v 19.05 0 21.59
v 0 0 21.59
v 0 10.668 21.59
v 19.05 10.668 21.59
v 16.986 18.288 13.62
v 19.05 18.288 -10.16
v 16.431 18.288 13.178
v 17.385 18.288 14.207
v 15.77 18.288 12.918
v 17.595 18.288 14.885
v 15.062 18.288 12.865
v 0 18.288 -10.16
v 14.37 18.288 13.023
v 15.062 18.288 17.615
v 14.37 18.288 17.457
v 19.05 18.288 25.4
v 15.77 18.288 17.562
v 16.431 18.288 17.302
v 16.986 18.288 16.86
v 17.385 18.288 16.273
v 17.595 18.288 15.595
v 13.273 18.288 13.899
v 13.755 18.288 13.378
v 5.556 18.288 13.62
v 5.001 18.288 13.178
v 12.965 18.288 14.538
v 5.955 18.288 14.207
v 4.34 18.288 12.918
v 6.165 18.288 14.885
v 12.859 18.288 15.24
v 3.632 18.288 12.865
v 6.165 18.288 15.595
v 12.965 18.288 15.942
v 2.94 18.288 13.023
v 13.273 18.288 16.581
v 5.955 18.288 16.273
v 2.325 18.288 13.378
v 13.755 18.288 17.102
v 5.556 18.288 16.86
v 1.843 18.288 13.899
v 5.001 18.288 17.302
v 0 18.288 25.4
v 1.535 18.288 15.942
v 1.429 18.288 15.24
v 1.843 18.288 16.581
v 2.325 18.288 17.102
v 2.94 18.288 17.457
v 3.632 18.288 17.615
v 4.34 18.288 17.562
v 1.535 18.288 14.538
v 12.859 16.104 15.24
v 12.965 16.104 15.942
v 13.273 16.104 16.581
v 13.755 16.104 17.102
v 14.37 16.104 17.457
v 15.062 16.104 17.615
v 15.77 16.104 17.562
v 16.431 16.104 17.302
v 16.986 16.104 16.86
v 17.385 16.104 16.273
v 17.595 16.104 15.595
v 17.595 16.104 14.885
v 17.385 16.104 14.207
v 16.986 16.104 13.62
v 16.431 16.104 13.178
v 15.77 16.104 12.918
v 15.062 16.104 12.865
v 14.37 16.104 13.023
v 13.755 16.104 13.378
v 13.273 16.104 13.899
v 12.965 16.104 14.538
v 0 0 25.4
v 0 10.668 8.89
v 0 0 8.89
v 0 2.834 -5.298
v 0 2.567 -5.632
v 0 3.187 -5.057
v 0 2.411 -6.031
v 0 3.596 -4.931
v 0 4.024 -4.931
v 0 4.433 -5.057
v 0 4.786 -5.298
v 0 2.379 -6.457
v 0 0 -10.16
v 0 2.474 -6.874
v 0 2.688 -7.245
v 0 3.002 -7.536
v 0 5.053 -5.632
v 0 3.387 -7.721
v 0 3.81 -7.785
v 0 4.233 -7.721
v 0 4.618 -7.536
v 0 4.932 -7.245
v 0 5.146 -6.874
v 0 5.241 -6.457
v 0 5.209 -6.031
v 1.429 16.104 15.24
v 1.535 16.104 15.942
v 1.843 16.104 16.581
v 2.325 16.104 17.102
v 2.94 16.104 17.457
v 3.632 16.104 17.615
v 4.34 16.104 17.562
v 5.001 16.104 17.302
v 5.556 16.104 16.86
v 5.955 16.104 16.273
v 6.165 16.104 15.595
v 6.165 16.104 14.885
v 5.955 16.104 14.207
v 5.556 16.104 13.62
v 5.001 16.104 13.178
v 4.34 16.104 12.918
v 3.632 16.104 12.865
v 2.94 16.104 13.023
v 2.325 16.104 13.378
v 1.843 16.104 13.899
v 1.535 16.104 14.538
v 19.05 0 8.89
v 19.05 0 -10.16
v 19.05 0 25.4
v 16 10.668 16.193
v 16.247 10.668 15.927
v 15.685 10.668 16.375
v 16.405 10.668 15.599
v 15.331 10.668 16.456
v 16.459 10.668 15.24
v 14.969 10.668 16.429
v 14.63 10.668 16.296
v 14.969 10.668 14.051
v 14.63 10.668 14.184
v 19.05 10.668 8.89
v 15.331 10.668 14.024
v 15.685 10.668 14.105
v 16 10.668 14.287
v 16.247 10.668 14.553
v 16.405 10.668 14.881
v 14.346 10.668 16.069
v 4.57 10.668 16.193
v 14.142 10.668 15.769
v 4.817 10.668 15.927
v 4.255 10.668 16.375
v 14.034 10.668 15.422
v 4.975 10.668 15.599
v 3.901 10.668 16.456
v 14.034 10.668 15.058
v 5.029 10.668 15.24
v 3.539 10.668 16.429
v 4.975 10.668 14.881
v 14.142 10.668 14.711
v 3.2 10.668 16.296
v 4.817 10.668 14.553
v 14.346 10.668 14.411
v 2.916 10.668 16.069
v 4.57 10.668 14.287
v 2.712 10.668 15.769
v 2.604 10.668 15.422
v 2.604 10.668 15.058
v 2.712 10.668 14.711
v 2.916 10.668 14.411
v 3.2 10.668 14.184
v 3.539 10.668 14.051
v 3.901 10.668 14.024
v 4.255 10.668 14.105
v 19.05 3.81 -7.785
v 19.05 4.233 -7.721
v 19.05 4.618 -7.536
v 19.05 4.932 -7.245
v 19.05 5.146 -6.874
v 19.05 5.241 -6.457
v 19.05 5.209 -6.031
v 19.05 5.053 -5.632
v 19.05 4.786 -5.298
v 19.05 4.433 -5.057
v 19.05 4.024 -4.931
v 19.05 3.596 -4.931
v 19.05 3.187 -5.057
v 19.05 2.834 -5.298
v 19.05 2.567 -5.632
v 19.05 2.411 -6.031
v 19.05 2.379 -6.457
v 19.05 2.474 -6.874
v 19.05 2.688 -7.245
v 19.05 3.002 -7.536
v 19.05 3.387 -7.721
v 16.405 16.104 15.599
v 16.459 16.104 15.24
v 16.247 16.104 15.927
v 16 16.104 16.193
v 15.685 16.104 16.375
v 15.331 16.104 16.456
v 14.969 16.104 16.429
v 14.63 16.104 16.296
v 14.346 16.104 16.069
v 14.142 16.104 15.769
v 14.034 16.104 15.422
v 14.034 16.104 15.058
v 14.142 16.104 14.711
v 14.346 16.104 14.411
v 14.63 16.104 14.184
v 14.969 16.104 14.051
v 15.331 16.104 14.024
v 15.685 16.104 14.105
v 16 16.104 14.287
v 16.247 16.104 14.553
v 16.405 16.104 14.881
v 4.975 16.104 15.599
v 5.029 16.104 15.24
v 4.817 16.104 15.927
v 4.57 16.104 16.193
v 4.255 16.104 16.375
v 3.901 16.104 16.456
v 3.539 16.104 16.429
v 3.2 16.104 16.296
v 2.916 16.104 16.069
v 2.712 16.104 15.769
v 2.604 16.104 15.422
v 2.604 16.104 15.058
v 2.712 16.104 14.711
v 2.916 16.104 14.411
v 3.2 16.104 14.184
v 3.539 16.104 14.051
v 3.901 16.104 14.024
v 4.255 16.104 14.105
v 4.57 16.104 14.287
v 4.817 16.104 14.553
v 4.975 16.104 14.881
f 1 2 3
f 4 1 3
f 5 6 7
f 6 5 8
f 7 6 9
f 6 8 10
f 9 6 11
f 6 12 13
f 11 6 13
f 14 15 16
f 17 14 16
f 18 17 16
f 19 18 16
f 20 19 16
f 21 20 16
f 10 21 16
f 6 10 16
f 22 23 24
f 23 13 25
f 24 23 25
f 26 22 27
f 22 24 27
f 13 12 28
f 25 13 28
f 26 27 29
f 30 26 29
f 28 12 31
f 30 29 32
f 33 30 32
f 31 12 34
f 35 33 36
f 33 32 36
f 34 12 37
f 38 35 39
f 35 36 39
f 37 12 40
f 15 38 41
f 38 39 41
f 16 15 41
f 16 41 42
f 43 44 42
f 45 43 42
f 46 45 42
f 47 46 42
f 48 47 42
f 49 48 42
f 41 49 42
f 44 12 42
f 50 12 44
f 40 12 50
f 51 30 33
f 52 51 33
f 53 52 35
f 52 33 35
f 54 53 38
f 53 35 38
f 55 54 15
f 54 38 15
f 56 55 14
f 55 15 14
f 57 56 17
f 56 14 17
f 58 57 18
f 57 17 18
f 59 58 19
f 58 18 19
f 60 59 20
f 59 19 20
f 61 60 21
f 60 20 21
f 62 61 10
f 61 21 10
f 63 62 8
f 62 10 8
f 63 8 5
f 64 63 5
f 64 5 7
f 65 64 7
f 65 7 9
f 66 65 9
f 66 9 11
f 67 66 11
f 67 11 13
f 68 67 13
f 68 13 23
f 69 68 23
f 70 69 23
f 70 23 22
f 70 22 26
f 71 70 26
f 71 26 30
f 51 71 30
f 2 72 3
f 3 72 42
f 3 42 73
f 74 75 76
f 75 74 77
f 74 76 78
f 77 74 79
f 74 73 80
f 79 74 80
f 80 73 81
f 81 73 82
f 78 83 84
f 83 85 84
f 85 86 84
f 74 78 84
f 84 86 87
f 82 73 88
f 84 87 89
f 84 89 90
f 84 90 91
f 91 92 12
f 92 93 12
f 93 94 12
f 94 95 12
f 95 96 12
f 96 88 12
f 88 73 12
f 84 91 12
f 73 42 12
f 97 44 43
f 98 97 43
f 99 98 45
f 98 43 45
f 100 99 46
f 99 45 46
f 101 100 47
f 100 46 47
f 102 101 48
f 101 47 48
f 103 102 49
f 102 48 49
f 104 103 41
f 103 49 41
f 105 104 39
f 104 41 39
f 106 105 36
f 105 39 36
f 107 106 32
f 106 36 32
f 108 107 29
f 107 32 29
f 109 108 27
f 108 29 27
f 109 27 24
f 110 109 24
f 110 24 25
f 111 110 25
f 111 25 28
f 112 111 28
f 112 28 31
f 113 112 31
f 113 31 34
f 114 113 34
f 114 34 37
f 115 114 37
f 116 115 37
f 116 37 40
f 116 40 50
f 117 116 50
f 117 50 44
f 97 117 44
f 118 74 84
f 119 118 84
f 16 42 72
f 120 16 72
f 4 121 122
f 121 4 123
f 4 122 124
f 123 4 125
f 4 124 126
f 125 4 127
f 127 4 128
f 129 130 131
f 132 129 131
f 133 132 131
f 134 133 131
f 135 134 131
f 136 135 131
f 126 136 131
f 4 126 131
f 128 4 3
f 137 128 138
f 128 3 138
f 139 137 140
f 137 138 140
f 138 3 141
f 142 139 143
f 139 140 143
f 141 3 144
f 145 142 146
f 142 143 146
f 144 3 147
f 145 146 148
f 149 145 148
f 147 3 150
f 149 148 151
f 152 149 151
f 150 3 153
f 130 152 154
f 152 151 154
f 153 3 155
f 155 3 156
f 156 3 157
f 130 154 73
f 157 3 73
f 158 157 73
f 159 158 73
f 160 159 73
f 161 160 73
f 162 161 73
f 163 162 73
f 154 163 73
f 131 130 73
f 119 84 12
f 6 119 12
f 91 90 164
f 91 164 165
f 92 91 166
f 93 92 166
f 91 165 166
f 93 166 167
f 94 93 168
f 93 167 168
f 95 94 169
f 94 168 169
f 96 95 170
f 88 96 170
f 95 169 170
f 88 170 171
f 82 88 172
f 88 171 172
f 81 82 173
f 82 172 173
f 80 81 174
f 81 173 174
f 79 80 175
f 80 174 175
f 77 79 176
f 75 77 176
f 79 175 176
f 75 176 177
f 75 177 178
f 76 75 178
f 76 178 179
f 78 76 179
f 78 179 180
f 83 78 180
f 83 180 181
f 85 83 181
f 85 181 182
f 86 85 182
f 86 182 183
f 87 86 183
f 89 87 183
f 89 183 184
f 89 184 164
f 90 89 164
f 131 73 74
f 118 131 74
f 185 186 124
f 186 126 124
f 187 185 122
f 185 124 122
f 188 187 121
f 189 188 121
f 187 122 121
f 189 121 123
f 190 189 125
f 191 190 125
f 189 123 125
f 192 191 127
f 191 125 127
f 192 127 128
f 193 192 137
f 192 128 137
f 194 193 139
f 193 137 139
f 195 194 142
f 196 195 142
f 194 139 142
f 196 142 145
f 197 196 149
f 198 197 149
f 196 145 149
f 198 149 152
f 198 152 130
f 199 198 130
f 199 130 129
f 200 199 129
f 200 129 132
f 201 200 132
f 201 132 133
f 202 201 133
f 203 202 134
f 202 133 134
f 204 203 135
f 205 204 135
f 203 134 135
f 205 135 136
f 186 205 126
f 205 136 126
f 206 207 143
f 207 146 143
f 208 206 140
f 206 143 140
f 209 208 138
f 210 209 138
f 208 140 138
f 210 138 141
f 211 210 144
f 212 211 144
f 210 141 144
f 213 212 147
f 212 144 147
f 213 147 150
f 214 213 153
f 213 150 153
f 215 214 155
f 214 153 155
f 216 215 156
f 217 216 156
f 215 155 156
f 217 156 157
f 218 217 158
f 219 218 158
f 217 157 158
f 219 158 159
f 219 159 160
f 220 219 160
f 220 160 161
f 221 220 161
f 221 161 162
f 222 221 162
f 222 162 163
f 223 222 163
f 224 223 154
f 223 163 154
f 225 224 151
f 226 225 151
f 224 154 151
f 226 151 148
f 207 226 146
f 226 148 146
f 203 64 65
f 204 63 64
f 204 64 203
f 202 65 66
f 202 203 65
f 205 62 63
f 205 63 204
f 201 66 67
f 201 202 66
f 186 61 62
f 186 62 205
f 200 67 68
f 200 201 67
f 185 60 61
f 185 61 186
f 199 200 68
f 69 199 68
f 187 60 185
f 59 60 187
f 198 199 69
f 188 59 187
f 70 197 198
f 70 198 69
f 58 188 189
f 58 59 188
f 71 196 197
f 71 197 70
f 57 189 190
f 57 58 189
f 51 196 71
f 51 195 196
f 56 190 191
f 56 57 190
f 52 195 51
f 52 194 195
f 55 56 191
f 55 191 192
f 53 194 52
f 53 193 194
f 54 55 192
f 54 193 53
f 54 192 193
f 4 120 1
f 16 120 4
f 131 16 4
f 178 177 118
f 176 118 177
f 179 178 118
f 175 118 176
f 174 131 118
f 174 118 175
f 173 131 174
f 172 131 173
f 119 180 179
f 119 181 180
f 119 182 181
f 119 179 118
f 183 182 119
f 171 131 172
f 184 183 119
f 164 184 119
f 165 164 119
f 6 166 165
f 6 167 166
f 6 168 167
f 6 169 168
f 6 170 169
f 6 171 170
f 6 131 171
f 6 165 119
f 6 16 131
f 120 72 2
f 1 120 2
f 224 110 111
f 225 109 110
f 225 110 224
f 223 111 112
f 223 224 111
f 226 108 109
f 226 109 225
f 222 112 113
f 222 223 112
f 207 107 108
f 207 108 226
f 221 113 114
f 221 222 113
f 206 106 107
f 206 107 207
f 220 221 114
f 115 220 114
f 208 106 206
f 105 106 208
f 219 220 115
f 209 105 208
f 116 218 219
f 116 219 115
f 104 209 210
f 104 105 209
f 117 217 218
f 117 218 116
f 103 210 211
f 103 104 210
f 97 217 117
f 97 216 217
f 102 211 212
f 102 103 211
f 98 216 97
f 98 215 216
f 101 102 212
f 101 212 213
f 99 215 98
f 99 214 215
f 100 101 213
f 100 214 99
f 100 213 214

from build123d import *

# Parameters (mm, degrees)
BOSS_EXTRUDE1_DEPTH                            = 19.05
CBORE_FOR_2_SOCKET_HEAD_CAP_SCREW1_D           = 2.4384
CBORE_FOR_2_SOCKET_HEAD_CAP_SCREW1_CBORE_D     = 4.7625
CBORE_FOR_2_SOCKET_HEAD_CAP_SCREW1_CBORE_DEPTH = 2.1844
F_6_40_TAPPED_HOLE2_D                          = 2.8702


with BuildPart() as part:
    # Sketch1 → Boss-Extrude1 (new body)
    with BuildSketch(Plane(origin=(0, 0, 0), x_dir=(0, 0, -1), z_dir=(1, 0, 0))):
        Polygon((-8.89, 0), (10.16, 0), (10.16, 18.288), (-25.4, 18.288), (-25.4, 0), (-21.59, 0), (-21.59, 10.668), (-8.89, 10.668), align=None)
    extrude(amount=BOSS_EXTRUDE1_DEPTH)

    # CBORE for #2 Socket Head Cap Screw1 (through all)
    with Locations(Plane(origin=(0, 18.288, 0), x_dir=(-1, 0, 0), z_dir=(0, 1, 0))):
        with Locations((-3.81, 15.24), (-15.24, 15.24)):
            CounterBoreHole(CBORE_FOR_2_SOCKET_HEAD_CAP_SCREW1_D / 2, CBORE_FOR_2_SOCKET_HEAD_CAP_SCREW1_CBORE_D / 2, CBORE_FOR_2_SOCKET_HEAD_CAP_SCREW1_CBORE_DEPTH)

    # #6-40 Tapped Hole2 (through all)
    with Locations(Plane.ZY):
        with Locations((-6.35, 3.81)):
            Hole(F_6_40_TAPPED_HOLE2_D / 2)


solid = part.part
